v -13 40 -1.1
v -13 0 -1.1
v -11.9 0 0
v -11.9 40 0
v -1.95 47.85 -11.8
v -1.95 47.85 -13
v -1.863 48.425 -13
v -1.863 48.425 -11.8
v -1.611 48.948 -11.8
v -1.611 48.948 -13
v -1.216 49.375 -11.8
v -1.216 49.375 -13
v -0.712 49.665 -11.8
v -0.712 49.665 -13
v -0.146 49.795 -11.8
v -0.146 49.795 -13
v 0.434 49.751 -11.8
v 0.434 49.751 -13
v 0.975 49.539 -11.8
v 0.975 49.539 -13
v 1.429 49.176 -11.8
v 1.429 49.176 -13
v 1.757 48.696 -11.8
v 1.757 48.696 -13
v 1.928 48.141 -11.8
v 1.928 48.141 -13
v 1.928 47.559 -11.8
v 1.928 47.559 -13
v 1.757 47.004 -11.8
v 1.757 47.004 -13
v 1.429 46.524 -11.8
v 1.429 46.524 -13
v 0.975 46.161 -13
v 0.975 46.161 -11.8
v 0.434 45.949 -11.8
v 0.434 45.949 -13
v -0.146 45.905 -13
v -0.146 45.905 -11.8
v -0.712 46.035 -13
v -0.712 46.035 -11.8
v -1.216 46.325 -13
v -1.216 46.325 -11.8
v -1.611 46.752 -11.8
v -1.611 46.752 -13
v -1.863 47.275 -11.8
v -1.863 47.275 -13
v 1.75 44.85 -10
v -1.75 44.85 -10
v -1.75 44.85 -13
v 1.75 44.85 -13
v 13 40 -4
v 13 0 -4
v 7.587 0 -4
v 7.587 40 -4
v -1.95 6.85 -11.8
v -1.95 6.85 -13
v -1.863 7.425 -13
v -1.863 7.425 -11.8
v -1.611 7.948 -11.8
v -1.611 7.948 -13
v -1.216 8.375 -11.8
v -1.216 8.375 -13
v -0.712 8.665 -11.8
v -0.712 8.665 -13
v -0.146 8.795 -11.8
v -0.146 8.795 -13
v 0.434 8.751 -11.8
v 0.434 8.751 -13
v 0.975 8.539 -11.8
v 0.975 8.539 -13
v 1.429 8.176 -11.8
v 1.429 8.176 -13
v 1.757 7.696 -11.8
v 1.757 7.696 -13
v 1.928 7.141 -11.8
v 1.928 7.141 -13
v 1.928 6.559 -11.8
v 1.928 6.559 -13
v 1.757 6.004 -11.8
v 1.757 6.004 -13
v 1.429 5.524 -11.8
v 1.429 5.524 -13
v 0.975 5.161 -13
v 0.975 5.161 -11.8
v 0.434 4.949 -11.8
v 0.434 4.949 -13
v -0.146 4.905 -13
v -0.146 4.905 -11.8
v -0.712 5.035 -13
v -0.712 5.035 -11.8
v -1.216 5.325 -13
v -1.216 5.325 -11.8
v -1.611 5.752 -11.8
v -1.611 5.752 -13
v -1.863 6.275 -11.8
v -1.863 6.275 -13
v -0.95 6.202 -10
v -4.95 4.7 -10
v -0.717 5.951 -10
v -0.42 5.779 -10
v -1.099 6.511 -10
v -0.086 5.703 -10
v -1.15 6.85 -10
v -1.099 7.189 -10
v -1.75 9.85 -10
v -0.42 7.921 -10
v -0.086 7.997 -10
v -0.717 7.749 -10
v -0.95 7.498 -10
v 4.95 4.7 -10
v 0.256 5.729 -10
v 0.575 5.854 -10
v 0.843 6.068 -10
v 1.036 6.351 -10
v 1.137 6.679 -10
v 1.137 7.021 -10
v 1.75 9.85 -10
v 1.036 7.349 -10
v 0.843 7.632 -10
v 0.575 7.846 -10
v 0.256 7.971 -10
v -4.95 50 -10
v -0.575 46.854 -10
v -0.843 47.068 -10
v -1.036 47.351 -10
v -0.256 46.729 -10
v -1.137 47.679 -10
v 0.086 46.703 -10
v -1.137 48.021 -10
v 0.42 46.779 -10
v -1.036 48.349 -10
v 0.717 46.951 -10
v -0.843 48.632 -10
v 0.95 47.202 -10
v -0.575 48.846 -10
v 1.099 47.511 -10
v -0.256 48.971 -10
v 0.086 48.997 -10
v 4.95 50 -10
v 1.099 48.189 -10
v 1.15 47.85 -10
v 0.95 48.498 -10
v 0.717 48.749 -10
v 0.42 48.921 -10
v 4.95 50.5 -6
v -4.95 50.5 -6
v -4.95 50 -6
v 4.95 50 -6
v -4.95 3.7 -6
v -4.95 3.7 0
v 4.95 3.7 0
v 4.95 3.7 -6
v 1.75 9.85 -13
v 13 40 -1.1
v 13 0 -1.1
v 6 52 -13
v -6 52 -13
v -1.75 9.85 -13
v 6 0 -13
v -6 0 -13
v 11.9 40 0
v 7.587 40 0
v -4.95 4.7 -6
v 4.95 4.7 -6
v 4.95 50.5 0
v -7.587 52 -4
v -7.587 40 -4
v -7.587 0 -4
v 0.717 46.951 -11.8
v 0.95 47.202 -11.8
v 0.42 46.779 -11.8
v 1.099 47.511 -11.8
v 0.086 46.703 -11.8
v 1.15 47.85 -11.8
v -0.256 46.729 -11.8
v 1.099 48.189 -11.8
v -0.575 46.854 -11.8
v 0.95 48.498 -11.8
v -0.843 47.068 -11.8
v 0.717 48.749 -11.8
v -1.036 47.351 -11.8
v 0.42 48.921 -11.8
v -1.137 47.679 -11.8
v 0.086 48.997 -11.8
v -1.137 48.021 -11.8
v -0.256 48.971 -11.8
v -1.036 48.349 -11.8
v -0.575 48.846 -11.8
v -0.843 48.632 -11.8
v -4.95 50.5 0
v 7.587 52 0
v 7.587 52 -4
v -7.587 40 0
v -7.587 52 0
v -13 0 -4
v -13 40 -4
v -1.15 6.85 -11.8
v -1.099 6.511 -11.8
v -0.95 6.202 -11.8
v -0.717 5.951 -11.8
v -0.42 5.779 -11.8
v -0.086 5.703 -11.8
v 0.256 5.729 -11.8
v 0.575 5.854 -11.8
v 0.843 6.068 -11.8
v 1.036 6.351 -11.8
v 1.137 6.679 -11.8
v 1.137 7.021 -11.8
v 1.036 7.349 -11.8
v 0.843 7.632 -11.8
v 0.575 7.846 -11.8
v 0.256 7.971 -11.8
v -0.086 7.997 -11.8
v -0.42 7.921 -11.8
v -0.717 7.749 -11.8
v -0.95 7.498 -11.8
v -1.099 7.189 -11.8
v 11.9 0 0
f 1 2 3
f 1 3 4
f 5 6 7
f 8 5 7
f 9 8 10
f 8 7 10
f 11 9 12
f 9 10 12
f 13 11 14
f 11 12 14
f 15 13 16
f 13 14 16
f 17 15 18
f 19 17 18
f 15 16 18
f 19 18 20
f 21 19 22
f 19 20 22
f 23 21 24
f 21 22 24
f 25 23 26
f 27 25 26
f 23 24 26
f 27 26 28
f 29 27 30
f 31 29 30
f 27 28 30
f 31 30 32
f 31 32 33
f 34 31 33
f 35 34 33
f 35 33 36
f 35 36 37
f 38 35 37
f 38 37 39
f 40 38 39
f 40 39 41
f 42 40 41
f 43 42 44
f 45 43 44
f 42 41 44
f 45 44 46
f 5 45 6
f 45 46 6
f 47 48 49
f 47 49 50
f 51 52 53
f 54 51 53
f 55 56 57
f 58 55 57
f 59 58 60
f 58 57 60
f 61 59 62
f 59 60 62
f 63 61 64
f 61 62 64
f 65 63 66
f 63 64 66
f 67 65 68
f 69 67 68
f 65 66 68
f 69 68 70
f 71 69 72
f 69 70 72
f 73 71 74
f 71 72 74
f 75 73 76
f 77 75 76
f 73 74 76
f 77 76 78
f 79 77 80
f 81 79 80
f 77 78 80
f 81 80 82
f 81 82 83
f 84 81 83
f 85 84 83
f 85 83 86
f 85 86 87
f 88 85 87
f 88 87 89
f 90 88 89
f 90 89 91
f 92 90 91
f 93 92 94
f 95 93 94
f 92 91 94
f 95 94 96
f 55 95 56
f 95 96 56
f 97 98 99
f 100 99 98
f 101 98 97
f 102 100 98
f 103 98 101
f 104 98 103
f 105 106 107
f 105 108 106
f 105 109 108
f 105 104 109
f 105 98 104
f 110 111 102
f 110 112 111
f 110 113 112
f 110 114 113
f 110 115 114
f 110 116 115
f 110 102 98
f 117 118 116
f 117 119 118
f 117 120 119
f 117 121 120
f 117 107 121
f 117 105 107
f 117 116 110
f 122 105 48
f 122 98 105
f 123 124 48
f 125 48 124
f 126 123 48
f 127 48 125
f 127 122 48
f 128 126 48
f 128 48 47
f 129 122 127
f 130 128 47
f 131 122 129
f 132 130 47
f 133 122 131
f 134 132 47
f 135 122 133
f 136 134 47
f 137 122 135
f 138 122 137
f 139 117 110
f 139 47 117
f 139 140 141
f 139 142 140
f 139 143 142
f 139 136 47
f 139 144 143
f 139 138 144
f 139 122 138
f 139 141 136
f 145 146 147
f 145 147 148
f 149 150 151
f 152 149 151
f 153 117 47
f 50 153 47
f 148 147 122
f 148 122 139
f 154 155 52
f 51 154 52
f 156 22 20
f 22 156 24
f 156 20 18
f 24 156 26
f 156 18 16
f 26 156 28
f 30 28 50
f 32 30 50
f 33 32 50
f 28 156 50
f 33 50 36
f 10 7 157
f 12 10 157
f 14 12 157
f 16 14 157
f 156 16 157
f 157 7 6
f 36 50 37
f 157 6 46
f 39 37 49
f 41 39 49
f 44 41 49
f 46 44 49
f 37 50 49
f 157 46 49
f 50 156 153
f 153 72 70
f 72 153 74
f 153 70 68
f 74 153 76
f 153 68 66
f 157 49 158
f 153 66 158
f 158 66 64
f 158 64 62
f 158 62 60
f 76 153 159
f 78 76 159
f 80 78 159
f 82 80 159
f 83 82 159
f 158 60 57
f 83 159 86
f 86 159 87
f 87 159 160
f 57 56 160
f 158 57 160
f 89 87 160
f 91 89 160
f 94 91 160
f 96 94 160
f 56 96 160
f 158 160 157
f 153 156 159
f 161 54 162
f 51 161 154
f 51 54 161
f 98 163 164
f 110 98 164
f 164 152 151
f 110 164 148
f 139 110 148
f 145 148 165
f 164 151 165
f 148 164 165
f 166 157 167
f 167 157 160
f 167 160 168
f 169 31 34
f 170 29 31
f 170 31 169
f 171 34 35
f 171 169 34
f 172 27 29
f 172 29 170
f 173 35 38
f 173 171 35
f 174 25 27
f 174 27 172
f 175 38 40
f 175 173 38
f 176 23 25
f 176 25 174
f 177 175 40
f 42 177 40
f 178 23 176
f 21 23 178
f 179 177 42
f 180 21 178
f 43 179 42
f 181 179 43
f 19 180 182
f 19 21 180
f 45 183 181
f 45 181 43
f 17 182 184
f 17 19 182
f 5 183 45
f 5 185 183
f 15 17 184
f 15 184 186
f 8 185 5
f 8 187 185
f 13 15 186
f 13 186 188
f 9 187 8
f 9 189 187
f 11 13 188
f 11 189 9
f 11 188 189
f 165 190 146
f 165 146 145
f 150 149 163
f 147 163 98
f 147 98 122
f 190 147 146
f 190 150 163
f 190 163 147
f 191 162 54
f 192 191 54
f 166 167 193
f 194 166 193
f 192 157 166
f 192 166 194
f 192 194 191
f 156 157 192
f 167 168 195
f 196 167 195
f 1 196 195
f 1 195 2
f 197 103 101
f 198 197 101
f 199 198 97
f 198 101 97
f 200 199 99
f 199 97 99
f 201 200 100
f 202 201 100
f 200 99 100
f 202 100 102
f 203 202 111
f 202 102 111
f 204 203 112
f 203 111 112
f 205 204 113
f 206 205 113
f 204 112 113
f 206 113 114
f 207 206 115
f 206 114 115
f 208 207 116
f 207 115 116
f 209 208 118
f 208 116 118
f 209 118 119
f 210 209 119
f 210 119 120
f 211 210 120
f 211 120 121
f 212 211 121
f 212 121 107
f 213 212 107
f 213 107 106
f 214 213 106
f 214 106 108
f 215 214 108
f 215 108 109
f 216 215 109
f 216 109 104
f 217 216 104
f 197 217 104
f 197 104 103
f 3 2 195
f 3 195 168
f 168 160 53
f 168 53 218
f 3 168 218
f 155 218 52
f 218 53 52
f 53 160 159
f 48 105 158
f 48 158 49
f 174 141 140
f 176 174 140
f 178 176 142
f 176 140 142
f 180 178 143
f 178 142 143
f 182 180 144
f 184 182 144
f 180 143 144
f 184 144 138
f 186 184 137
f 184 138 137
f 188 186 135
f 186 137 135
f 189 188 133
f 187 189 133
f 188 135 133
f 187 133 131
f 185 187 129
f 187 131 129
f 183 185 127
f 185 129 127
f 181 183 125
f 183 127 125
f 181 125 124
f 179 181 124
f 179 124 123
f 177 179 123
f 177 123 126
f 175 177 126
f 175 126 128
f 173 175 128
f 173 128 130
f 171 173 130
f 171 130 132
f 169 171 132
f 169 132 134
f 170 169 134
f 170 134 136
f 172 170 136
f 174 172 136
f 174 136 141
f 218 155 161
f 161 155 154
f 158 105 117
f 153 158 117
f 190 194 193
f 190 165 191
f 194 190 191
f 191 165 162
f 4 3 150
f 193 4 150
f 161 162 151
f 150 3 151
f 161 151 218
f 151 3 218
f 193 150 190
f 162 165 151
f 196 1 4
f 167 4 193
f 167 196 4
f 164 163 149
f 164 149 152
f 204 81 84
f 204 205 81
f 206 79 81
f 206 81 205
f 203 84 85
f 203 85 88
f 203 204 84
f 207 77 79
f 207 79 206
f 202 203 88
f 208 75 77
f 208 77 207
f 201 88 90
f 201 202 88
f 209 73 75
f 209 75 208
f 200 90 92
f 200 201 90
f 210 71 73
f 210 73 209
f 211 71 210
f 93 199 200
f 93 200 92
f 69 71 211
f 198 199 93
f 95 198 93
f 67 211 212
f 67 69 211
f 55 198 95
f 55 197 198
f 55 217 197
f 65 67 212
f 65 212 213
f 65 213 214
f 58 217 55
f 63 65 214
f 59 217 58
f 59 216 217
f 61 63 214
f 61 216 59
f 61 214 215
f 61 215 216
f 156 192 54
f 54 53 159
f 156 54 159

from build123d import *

# Parameters (mm, degrees)
EXTRUDE_1_DEPTH     = 40
EXTRUDE_2_DEPTH     = 12
CHAMFER_1_SIZE      = 1.1
SKETCH_3_W          = 9.9
SKETCH_3_H          = 45.3
CUT_EXTRUDE_1_DEPTH = 10
SKETCH_4_W          = 3.5
SKETCH_4_H          = 35
CUT_EXTRUDE_2_DEPTH = 55.525223521
SKETCH_5_W          = 9.9
SKETCH_5_H          = 0.5
SKETCH_5_H_2        = 1
CUT_EXTRUDE_3_DEPTH = 6
SKETCH_6_R          = 1.15
CUT_EXTRUDE_4_DEPTH = 55.525223521
SKETCH_7_R          = 1.95
CUT_EXTRUDE_5_DEPTH = 1.2


with BuildPart() as part:
    # 草图1 → 凸台-拉伸1 (new body)
    with BuildSketch(Plane(origin=(0, 0, 0), x_dir=(1, 0, 0), z_dir=(0, 1, 0))):
        Polygon((-13, 0), (13, 0), (13, 4), (7.586942826, 4), (6, 13), (-6, 13), (-7.586942826, 4), (-13, 4), align=None)
    extrude(amount=EXTRUDE_1_DEPTH)

    # 草图2 → 凸台-拉伸2 (add)
    with BuildSketch(Plane(origin=(0, 40, 0), x_dir=(1, 0, 0), z_dir=(0, 1, 0))):
        Polygon((7.586942826, 4), (6, 13), (-6, 13), (-7.586942826, 4), (-7.586942826, 0), (7.586942826, 0), align=None)
    extrude(amount=EXTRUDE_2_DEPTH)

    # 倒角1
    chamfer_1_edges = [part.edges().sort_by_distance(p)[0] for p in [
        (13, 20, 0),
        (-13, 20, 0),
    ]]
    chamfer(chamfer_1_edges, length=CHAMFER_1_SIZE)

    # 草图3 → 切除-拉伸1 (cut)
    with BuildSketch(Plane.XY):
        with Locations((0, 27.35)):
            Rectangle(SKETCH_3_W, SKETCH_3_H)
    extrude(amount=-CUT_EXTRUDE_1_DEPTH, mode=Mode.SUBTRACT)

    # 草图4 → 切除-拉伸2 (cut, through all)
    with BuildSketch(Plane.XY.offset(-10)):
        with Locations((0, 27.35)):
            Rectangle(SKETCH_4_W, SKETCH_4_H)
    extrude(amount=-CUT_EXTRUDE_2_DEPTH, mode=Mode.SUBTRACT)

    # 草图5 → 切除-拉伸3 (cut)
    with BuildSketch(Plane.XY):
        with Locations((0, 50.25)):
            Rectangle(SKETCH_5_W, SKETCH_5_H)
        with Locations((0, 4.2)):
            Rectangle(SKETCH_5_W, SKETCH_5_H_2)
    extrude(amount=-CUT_EXTRUDE_3_DEPTH, mode=Mode.SUBTRACT)

    # 草图6 → 切除-拉伸4 (cut, through all)
    with BuildSketch(Plane.XY.offset(-10)):
        with Locations((0, 47.85)):
            Circle(SKETCH_6_R)
        with Locations(Location((0, 6.85, 0), (0, 0, 180))):
            Circle(SKETCH_6_R)
    extrude(amount=-CUT_EXTRUDE_4_DEPTH, mode=Mode.SUBTRACT)

    # 草图7 → 切除-拉伸5 (cut)
    with BuildSketch(Plane(origin=(0, 0, -13), x_dir=(-1, 0, 0), z_dir=(0, 0, -1))):
        with Locations((0, 47.85)):
            Circle(SKETCH_7_R)
        with Locations((0, 6.85)):
            Circle(SKETCH_7_R)
    extrude(amount=-CUT_EXTRUDE_5_DEPTH, mode=Mode.SUBTRACT)


solid = part.part
